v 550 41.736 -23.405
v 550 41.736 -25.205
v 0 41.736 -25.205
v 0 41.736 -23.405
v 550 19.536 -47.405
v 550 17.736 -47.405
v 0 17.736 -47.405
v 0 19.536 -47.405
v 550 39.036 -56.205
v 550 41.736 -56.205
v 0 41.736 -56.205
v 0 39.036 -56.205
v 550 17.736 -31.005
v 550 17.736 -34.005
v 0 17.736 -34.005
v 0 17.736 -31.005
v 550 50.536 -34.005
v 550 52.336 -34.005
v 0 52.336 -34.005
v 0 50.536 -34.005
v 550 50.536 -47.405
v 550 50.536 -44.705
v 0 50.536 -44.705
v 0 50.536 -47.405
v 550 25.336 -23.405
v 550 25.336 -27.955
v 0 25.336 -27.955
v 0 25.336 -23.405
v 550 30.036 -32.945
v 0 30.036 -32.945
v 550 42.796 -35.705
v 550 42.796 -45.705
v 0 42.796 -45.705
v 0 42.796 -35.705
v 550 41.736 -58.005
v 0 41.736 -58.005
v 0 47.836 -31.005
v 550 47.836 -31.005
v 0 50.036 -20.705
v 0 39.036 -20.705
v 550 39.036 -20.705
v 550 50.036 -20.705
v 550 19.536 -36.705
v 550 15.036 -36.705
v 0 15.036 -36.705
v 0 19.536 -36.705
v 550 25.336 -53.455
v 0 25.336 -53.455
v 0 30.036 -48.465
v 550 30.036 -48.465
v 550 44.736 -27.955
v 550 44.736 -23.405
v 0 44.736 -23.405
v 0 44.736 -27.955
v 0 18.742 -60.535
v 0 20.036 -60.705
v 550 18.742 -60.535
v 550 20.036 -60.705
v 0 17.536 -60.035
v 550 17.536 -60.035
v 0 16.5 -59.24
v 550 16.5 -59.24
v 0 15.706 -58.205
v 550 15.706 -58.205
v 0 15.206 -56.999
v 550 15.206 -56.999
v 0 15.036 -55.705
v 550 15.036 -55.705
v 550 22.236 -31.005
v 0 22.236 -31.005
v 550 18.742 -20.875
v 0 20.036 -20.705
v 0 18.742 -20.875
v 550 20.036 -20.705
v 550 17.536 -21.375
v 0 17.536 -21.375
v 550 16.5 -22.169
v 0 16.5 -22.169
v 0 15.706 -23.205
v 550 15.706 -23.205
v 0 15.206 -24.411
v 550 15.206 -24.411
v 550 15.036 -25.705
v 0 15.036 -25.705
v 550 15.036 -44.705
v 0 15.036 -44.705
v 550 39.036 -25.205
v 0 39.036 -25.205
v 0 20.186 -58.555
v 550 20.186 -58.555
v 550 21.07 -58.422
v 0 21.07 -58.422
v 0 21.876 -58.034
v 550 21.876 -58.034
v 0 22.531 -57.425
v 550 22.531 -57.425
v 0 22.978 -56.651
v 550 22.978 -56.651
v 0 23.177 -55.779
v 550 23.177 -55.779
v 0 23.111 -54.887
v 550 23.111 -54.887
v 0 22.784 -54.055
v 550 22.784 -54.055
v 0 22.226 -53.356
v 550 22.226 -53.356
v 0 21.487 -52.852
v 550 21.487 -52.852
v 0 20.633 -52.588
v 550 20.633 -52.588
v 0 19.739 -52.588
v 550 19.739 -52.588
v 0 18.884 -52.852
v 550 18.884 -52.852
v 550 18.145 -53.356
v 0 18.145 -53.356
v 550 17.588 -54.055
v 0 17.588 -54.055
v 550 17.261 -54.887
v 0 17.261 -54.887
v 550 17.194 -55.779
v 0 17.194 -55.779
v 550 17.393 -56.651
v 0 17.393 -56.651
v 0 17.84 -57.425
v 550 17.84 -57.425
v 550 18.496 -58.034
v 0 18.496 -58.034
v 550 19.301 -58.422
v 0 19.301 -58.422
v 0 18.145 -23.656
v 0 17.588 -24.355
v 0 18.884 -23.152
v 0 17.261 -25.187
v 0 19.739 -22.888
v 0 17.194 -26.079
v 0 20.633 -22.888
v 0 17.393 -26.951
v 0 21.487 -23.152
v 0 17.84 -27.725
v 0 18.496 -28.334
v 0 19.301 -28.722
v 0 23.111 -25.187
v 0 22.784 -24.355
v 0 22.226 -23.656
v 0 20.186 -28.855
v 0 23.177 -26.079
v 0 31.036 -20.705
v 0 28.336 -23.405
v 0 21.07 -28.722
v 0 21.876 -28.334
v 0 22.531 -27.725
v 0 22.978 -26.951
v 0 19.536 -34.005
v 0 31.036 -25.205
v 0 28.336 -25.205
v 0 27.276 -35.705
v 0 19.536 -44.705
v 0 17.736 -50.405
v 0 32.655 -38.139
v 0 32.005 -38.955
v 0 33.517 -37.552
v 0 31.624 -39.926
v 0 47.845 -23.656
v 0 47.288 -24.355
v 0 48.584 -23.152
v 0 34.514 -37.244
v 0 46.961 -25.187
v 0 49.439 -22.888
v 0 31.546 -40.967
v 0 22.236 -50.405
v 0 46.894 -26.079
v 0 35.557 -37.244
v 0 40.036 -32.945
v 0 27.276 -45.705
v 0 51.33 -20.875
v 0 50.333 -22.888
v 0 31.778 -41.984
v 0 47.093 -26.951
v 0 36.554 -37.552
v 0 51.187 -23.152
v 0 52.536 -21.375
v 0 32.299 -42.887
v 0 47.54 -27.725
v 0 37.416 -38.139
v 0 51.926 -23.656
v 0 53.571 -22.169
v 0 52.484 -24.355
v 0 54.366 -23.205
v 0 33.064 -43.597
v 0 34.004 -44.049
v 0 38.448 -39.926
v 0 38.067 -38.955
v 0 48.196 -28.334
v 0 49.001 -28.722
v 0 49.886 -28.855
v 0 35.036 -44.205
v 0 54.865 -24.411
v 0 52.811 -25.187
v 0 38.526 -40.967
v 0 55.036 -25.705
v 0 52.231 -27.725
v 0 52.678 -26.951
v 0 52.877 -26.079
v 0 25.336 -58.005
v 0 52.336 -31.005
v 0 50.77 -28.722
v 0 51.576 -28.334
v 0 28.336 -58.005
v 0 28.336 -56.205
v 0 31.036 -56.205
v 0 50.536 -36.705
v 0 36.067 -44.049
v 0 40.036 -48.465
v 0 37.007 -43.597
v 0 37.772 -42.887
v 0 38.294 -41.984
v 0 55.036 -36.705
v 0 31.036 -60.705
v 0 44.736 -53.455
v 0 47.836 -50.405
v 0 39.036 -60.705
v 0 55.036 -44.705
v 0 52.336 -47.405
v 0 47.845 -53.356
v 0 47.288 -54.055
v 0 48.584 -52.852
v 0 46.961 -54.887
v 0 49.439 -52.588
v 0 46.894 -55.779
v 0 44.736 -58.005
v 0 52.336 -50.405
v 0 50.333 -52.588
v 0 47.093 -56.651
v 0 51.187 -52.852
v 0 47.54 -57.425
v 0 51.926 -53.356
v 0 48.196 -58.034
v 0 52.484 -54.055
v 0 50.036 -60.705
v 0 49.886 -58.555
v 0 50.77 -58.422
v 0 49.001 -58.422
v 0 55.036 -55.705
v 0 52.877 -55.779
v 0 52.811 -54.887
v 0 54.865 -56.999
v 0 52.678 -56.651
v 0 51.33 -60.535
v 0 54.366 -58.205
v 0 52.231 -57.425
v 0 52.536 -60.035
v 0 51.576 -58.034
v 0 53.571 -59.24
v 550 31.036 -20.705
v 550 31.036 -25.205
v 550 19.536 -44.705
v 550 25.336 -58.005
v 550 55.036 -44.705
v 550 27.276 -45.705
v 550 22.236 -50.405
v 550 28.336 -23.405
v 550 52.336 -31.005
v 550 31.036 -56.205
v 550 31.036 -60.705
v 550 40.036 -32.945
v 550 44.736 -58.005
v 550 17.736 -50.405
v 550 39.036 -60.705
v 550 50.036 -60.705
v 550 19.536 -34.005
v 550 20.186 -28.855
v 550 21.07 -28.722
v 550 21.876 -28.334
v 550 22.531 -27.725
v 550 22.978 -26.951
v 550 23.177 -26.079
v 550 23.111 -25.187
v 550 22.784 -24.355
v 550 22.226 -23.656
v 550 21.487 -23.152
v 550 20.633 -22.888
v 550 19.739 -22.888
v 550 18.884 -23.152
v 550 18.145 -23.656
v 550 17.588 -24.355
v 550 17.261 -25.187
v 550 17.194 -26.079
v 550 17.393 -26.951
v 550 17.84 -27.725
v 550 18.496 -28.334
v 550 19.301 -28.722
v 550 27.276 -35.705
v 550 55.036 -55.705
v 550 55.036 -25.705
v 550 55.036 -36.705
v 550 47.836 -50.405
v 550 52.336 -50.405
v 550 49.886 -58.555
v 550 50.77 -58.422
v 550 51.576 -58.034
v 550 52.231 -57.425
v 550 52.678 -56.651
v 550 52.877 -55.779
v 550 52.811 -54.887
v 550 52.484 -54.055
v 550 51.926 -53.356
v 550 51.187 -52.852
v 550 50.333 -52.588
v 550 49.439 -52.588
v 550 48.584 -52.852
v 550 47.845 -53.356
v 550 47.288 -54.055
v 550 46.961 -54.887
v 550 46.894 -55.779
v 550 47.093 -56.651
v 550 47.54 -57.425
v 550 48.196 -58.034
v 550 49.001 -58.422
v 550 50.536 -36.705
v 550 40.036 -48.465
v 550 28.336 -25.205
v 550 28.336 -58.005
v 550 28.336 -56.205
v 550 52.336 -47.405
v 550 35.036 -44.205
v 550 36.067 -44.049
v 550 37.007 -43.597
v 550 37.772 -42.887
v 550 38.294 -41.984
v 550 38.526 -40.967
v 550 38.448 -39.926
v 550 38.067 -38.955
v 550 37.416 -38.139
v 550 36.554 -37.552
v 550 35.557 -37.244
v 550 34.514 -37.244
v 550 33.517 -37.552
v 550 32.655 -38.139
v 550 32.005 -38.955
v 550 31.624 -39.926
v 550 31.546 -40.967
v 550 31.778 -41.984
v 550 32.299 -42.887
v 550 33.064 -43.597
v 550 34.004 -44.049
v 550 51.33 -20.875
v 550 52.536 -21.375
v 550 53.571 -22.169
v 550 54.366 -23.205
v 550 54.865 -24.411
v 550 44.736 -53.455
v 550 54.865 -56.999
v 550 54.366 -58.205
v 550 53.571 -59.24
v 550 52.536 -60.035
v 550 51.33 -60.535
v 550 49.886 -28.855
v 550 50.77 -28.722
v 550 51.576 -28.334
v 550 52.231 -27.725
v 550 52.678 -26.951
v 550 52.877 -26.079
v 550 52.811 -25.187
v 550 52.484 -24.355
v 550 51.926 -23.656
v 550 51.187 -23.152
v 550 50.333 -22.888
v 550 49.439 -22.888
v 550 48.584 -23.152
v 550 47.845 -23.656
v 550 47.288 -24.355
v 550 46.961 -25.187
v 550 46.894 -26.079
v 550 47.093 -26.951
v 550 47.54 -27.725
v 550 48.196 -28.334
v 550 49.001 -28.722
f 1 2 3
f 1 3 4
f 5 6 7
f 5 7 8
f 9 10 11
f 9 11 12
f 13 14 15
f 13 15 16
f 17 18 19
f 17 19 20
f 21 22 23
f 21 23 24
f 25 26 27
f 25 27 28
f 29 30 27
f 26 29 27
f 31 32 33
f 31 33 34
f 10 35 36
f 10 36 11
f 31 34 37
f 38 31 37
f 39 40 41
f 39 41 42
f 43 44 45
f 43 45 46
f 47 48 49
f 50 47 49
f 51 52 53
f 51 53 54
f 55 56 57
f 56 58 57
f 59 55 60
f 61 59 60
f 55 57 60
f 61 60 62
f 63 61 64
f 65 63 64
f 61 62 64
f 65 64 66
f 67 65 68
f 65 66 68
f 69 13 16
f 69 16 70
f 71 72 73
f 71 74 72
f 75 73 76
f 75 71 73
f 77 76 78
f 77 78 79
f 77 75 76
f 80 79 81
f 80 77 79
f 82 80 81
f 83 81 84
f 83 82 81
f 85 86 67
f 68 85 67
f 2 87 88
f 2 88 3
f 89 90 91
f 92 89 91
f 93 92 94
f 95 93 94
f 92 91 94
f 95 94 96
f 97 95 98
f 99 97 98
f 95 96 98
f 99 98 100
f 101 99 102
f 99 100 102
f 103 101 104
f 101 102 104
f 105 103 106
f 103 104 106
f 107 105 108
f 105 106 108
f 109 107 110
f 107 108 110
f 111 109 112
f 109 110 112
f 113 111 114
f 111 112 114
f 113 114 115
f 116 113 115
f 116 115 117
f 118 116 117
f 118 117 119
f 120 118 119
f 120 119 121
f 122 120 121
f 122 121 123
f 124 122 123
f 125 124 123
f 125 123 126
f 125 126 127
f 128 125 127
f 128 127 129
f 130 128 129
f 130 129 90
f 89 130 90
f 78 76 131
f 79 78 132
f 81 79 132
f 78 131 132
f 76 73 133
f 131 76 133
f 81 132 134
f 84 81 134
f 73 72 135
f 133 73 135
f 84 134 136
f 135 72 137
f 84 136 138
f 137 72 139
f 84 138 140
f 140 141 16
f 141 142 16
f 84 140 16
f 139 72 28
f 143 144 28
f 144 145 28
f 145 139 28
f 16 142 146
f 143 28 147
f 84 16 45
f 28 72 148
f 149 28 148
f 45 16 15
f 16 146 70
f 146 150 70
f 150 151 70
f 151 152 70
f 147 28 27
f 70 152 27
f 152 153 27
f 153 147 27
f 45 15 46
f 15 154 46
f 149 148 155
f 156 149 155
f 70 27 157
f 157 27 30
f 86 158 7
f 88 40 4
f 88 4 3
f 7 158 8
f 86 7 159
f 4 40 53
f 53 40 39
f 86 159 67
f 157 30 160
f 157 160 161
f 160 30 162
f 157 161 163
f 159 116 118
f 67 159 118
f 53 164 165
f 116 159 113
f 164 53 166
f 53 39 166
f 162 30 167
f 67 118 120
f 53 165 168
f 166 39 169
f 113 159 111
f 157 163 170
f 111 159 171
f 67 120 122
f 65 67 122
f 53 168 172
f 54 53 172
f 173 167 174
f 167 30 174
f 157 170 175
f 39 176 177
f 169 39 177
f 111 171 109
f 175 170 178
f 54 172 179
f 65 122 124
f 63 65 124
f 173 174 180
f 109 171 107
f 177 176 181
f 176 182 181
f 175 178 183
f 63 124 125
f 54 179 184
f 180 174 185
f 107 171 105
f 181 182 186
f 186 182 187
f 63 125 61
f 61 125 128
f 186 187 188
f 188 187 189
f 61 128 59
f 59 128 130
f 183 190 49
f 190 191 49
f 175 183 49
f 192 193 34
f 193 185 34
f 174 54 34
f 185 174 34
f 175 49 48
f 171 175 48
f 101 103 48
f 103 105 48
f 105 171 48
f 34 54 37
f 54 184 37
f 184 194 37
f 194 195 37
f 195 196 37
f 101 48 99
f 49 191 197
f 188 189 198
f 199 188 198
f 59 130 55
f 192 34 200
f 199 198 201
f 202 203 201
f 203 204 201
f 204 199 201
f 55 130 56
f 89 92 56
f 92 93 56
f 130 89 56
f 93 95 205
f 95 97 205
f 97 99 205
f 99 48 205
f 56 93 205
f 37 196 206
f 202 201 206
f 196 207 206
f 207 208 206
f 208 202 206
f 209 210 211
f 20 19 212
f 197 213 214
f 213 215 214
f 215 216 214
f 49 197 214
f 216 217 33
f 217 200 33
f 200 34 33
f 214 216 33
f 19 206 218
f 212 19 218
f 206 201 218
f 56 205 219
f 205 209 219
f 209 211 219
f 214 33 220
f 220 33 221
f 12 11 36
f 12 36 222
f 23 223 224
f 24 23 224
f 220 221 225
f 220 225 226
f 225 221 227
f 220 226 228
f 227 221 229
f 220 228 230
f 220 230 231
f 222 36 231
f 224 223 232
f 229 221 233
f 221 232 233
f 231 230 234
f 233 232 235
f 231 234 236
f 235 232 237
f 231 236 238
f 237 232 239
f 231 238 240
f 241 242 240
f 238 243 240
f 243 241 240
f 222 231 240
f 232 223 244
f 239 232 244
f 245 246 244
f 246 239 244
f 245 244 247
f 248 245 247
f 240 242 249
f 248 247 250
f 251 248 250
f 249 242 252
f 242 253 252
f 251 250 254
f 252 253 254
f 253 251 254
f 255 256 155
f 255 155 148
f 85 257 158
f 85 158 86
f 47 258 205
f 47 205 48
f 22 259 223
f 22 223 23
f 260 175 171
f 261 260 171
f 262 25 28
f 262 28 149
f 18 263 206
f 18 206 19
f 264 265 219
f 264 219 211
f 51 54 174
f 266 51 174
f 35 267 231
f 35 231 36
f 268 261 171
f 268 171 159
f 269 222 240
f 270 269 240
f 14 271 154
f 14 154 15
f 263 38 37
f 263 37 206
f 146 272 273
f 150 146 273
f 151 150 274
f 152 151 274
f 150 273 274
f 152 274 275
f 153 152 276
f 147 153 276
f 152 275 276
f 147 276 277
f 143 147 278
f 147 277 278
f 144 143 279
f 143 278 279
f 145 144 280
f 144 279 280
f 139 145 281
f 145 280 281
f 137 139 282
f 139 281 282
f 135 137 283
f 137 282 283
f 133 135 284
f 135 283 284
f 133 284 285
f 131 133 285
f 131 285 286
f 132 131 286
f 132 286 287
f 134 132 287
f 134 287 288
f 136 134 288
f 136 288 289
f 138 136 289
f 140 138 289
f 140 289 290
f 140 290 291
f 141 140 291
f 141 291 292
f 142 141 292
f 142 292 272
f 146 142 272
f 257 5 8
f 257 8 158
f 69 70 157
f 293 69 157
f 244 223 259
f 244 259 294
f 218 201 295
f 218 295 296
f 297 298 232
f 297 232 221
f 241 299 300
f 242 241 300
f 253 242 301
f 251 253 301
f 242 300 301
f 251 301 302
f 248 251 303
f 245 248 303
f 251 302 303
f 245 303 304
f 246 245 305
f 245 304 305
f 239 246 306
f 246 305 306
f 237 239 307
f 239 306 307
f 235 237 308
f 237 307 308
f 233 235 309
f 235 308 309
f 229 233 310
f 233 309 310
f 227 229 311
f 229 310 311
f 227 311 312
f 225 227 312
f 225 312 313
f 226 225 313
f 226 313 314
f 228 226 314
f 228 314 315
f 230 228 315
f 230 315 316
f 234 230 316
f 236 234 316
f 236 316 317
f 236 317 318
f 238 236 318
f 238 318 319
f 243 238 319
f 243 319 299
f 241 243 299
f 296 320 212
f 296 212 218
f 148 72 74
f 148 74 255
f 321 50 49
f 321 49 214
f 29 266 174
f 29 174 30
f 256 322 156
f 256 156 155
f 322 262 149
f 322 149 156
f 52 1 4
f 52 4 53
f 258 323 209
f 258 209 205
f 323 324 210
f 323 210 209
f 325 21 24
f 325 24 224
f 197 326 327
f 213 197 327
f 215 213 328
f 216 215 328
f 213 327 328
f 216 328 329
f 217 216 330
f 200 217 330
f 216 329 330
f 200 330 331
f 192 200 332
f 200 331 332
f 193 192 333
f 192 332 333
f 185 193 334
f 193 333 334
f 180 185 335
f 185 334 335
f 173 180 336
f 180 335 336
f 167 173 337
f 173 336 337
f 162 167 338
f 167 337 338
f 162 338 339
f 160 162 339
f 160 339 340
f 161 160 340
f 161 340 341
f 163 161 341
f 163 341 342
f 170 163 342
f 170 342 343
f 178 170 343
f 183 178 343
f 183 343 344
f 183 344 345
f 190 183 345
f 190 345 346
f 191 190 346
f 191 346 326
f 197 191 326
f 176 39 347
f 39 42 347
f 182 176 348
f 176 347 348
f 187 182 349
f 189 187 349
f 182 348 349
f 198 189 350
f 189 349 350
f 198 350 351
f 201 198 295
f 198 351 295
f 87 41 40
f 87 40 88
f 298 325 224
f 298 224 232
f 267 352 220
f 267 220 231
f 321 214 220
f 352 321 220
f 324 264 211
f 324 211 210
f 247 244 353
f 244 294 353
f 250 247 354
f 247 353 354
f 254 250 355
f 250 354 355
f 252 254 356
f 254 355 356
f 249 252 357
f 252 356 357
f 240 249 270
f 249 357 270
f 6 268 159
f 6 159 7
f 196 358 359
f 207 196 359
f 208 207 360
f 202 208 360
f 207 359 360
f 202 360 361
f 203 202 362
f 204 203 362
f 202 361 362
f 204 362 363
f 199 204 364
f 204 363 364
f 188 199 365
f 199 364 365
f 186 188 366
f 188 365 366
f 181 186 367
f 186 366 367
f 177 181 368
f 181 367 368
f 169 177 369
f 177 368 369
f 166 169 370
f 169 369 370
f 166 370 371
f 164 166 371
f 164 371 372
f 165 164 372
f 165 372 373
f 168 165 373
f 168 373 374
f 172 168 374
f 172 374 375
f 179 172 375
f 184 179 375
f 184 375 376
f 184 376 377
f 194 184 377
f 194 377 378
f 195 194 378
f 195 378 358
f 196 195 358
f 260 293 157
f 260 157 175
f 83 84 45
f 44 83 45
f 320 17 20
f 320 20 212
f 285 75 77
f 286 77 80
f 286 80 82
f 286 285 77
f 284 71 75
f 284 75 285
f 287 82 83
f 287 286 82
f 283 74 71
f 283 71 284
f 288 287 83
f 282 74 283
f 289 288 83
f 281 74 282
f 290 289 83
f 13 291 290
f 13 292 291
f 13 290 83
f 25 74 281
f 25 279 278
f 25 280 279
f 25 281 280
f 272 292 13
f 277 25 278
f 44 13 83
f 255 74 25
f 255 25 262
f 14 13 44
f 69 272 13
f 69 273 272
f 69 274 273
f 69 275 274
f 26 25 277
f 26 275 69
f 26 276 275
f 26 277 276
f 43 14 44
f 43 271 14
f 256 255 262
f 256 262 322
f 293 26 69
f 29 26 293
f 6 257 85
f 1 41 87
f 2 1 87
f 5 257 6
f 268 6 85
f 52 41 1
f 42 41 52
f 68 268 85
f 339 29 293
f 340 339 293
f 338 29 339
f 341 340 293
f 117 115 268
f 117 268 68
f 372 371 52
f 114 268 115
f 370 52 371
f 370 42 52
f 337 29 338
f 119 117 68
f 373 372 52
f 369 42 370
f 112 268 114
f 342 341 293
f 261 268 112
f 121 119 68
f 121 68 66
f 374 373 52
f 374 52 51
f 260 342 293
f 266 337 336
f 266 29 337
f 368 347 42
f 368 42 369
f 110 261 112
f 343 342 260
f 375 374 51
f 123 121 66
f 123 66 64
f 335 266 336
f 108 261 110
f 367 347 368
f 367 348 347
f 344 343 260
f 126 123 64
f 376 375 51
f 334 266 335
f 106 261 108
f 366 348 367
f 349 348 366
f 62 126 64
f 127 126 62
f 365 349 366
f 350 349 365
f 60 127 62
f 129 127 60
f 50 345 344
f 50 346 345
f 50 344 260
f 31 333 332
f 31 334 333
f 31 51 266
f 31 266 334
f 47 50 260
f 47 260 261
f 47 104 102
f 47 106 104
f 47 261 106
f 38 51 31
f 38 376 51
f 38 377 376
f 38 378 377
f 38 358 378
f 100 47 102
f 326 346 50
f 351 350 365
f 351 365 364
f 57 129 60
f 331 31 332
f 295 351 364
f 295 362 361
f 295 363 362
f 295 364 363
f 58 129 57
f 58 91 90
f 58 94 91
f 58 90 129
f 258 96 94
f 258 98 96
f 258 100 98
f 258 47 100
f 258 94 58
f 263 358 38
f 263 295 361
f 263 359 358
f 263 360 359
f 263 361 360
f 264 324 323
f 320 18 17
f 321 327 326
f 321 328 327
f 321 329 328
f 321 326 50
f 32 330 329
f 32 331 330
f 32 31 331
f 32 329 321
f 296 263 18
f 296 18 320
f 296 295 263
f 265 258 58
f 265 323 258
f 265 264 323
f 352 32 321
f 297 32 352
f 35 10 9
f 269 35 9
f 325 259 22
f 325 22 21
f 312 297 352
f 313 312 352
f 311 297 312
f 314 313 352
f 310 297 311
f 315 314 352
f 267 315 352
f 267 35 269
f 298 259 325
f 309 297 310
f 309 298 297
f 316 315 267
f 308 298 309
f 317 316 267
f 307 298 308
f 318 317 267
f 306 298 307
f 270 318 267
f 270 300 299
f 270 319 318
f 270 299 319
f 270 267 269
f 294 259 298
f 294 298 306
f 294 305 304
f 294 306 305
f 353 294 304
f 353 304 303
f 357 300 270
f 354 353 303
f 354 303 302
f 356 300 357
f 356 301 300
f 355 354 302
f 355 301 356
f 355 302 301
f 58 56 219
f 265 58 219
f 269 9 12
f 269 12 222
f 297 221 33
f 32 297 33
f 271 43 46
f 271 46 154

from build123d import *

# Parameters (mm, degrees)
SKETCH_1_W          = 40
SKETCH_1_H          = 40
EXTRUDE_1_DEPTH     = 550
CUT_EXTRUDE_1_REACH = 558.07
SKETCH_2_R          = 3.5
SKETCH_2_R_2        = 3
FILLET_1_R          = 5


with BuildPart() as part:
    # 草图1 → 凸台-拉伸1 (new body)
    with BuildSketch(Plane(origin=(0, 0, 0), x_dir=(0, 0, -1), z_dir=(1, 0, 0))):
        with Locations((40.704960836, 35.035758607)):
            Rectangle(SKETCH_1_W, SKETCH_1_H)
    extrude(amount=EXTRUDE_1_DEPTH)

    # 草图2 → 切除-拉伸1 (cut, up to next)
    with BuildSketch(Plane(origin=(550, 0, 0), x_dir=(0, 0, -1), z_dir=(1, 0, 0)), mode=Mode.PRIVATE) as cut_extrude_1_sk1:
        with Locations((40.704960836, 35.035758607)):
            Circle(SKETCH_2_R)
    cut_extrude_1_tool1 = extrude(cut_extrude_1_sk1.sketch, amount=-CUT_EXTRUDE_1_REACH, mode=Mode.PRIVATE) & part.part
    # 草图2 → 切除-拉伸1 (cut, up to next)
    with BuildSketch(Plane(origin=(550, 0, 0), x_dir=(0, 0, -1), z_dir=(1, 0, 0)), mode=Mode.PRIVATE) as cut_extrude_1_sk2:
        with Locations((25.854960836, 49.885758607)):
            Circle(SKETCH_2_R_2)
    cut_extrude_1_tool2 = extrude(cut_extrude_1_sk2.sketch, amount=-CUT_EXTRUDE_1_REACH, mode=Mode.PRIVATE) & part.part
    # 草图2 → 切除-拉伸1 (cut, up to next)
    with BuildSketch(Plane(origin=(550, 0, 0), x_dir=(0, 0, -1), z_dir=(1, 0, 0)), mode=Mode.PRIVATE) as cut_extrude_1_sk3:
        with Locations((25.854960836, 20.185758607)):
            Circle(SKETCH_2_R_2)
    cut_extrude_1_tool3 = extrude(cut_extrude_1_sk3.sketch, amount=-CUT_EXTRUDE_1_REACH, mode=Mode.PRIVATE) & part.part
    # 草图2 → 切除-拉伸1 (cut, up to next)
    with BuildSketch(Plane(origin=(550, 0, 0), x_dir=(0, 0, -1), z_dir=(1, 0, 0)), mode=Mode.PRIVATE) as cut_extrude_1_sk4:
        with Locations((55.554960836, 49.885758607)):
            Circle(SKETCH_2_R_2)
    cut_extrude_1_tool4 = extrude(cut_extrude_1_sk4.sketch, amount=-CUT_EXTRUDE_1_REACH, mode=Mode.PRIVATE) & part.part
    # 草图2 → 切除-拉伸1 (cut, up to next)
    with BuildSketch(Plane(origin=(550, 0, 0), x_dir=(0, 0, -1), z_dir=(1, 0, 0)), mode=Mode.PRIVATE) as cut_extrude_1_sk5:
        with Locations((55.554960836, 20.185758607)):
            Circle(SKETCH_2_R_2)
    cut_extrude_1_tool5 = extrude(cut_extrude_1_sk5.sketch, amount=-CUT_EXTRUDE_1_REACH, mode=Mode.PRIVATE) & part.part
    # 草图2 → 切除-拉伸1 (cut, up to next)
    with BuildSketch(Plane(origin=(550, 0, 0), x_dir=(0, 0, -1), z_dir=(1, 0, 0)), mode=Mode.PRIVATE) as cut_extrude_1_sk6:
        Polygon((36.704960836, 15.035758607), (36.704960836, 19.535758607), (34.004960836, 19.535758607), (34.004960836, 17.735758607), (31.004960836, 17.735758607), (31.004960836, 22.235758607), (35.704960836, 27.275758607), (45.704960836, 27.275758607), (50.404960836, 22.235758607), (50.404960836, 17.735758607), (47.404960836, 17.735758607), (47.404960836, 19.535758607), (44.704960836, 19.535758607), (44.704960836, 15.035758607), align=None)
    cut_extrude_1_tool6 = extrude(cut_extrude_1_sk6.sketch, amount=-CUT_EXTRUDE_1_REACH, mode=Mode.PRIVATE) & part.part
    # 草图2 → 切除-拉伸1 (cut, up to next)
    with BuildSketch(Plane(origin=(550, 0, 0), x_dir=(0, 0, -1), z_dir=(1, 0, 0)), mode=Mode.PRIVATE) as cut_extrude_1_sk7:
        Polygon((44.704960836, 55.035758607), (44.704960836, 50.535758607), (47.404960836, 50.535758607), (47.404960836, 52.335758607), (50.404960836, 52.335758607), (50.404960836, 47.835758607), (45.704960836, 42.795758607), (35.704960836, 42.795758607), (31.004960836, 47.835758607), (31.004960836, 52.335758607), (34.004960836, 52.335758607), (34.004960836, 50.535758607), (36.704960836, 50.535758607), (36.704960836, 55.035758607), align=None)
    cut_extrude_1_tool7 = extrude(cut_extrude_1_sk7.sketch, amount=-CUT_EXTRUDE_1_REACH, mode=Mode.PRIVATE) & part.part
    # 草图2 → 切除-拉伸1 (cut, up to next)
    with BuildSketch(Plane(origin=(550, 0, 0), x_dir=(0, 0, -1), z_dir=(1, 0, 0)), mode=Mode.PRIVATE) as cut_extrude_1_sk8:
        Polygon((20.704960836, 31.035758607), (20.704960836, 39.035758607), (25.204960836, 39.035758607), (25.204960836, 41.735758607), (23.404960836, 41.735758607), (23.404960836, 44.735758607), (27.954960836, 44.735758607), (32.944960836, 40.035758607), (32.944960836, 30.035758607), (27.954960836, 25.335758607), (23.404960836, 25.335758607), (23.404960836, 28.335758607), (25.204960836, 28.335758607), (25.204960836, 31.035758607), align=None)
    cut_extrude_1_tool8 = extrude(cut_extrude_1_sk8.sketch, amount=-CUT_EXTRUDE_1_REACH, mode=Mode.PRIVATE) & part.part
    # 草图2 → 切除-拉伸1 (cut, up to next)
    with BuildSketch(Plane(origin=(550, 0, 0), x_dir=(0, 0, -1), z_dir=(1, 0, 0)), mode=Mode.PRIVATE) as cut_extrude_1_sk9:
        Polygon((60.704960836, 31.035758607), (56.204960836, 31.035758607), (56.204960836, 28.335758607), (58.004960836, 28.335758607), (58.004960836, 25.335758607), (53.454960836, 25.335758607), (48.464960836, 30.035758607), (48.464960836, 40.035758607), (53.454960836, 44.735758607), (58.004960836, 44.735758607), (58.004960836, 41.735758607), (56.204960836, 41.735758607), (56.204960836, 39.035758607), (60.704960836, 39.035758607), align=None)
    cut_extrude_1_tool9 = extrude(cut_extrude_1_sk9.sketch, amount=-CUT_EXTRUDE_1_REACH, mode=Mode.PRIVATE) & part.part
    add(cut_extrude_1_tool1.solids().sort_by_distance((550, 35.035759, -40.704961))[0], mode=Mode.SUBTRACT)
    add(cut_extrude_1_tool2.solids().sort_by_distance((550, 49.885759, -25.854961))[0], mode=Mode.SUBTRACT)
    add(cut_extrude_1_tool3.solids().sort_by_distance((550, 20.185759, -25.854961))[0], mode=Mode.SUBTRACT)
    add(cut_extrude_1_tool4.solids().sort_by_distance((550, 49.885759, -55.554961))[0], mode=Mode.SUBTRACT)
    add(cut_extrude_1_tool5.solids().sort_by_distance((550, 20.185759, -55.554961))[0], mode=Mode.SUBTRACT)
    add(cut_extrude_1_tool6.solids().sort_by_distance((550, 21.537481, -40.704961))[0], mode=Mode.SUBTRACT)
    add(cut_extrude_1_tool7.solids().sort_by_distance((550, 48.534036, -40.704961))[0], mode=Mode.SUBTRACT)
    add(cut_extrude_1_tool8.solids().sort_by_distance((550, 35.035759, -27.209927))[0], mode=Mode.SUBTRACT)
    add(cut_extrude_1_tool9.solids().sort_by_distance((550, 35.035759, -54.199995))[0], mode=Mode.SUBTRACT)

    # 圆角1
    fillet_1_edges = [part.edges().sort_by_distance(p)[0] for p in [
        (275, 55.035758607, -20.704960836),
        (275, 55.035758607, -60.704960836),
        (275, 15.035758607, -60.704960836),
        (275, 15.035758607, -20.704960836),
    ]]
    fillet(fillet_1_edges, radius=FILLET_1_R)


solid = part.part
